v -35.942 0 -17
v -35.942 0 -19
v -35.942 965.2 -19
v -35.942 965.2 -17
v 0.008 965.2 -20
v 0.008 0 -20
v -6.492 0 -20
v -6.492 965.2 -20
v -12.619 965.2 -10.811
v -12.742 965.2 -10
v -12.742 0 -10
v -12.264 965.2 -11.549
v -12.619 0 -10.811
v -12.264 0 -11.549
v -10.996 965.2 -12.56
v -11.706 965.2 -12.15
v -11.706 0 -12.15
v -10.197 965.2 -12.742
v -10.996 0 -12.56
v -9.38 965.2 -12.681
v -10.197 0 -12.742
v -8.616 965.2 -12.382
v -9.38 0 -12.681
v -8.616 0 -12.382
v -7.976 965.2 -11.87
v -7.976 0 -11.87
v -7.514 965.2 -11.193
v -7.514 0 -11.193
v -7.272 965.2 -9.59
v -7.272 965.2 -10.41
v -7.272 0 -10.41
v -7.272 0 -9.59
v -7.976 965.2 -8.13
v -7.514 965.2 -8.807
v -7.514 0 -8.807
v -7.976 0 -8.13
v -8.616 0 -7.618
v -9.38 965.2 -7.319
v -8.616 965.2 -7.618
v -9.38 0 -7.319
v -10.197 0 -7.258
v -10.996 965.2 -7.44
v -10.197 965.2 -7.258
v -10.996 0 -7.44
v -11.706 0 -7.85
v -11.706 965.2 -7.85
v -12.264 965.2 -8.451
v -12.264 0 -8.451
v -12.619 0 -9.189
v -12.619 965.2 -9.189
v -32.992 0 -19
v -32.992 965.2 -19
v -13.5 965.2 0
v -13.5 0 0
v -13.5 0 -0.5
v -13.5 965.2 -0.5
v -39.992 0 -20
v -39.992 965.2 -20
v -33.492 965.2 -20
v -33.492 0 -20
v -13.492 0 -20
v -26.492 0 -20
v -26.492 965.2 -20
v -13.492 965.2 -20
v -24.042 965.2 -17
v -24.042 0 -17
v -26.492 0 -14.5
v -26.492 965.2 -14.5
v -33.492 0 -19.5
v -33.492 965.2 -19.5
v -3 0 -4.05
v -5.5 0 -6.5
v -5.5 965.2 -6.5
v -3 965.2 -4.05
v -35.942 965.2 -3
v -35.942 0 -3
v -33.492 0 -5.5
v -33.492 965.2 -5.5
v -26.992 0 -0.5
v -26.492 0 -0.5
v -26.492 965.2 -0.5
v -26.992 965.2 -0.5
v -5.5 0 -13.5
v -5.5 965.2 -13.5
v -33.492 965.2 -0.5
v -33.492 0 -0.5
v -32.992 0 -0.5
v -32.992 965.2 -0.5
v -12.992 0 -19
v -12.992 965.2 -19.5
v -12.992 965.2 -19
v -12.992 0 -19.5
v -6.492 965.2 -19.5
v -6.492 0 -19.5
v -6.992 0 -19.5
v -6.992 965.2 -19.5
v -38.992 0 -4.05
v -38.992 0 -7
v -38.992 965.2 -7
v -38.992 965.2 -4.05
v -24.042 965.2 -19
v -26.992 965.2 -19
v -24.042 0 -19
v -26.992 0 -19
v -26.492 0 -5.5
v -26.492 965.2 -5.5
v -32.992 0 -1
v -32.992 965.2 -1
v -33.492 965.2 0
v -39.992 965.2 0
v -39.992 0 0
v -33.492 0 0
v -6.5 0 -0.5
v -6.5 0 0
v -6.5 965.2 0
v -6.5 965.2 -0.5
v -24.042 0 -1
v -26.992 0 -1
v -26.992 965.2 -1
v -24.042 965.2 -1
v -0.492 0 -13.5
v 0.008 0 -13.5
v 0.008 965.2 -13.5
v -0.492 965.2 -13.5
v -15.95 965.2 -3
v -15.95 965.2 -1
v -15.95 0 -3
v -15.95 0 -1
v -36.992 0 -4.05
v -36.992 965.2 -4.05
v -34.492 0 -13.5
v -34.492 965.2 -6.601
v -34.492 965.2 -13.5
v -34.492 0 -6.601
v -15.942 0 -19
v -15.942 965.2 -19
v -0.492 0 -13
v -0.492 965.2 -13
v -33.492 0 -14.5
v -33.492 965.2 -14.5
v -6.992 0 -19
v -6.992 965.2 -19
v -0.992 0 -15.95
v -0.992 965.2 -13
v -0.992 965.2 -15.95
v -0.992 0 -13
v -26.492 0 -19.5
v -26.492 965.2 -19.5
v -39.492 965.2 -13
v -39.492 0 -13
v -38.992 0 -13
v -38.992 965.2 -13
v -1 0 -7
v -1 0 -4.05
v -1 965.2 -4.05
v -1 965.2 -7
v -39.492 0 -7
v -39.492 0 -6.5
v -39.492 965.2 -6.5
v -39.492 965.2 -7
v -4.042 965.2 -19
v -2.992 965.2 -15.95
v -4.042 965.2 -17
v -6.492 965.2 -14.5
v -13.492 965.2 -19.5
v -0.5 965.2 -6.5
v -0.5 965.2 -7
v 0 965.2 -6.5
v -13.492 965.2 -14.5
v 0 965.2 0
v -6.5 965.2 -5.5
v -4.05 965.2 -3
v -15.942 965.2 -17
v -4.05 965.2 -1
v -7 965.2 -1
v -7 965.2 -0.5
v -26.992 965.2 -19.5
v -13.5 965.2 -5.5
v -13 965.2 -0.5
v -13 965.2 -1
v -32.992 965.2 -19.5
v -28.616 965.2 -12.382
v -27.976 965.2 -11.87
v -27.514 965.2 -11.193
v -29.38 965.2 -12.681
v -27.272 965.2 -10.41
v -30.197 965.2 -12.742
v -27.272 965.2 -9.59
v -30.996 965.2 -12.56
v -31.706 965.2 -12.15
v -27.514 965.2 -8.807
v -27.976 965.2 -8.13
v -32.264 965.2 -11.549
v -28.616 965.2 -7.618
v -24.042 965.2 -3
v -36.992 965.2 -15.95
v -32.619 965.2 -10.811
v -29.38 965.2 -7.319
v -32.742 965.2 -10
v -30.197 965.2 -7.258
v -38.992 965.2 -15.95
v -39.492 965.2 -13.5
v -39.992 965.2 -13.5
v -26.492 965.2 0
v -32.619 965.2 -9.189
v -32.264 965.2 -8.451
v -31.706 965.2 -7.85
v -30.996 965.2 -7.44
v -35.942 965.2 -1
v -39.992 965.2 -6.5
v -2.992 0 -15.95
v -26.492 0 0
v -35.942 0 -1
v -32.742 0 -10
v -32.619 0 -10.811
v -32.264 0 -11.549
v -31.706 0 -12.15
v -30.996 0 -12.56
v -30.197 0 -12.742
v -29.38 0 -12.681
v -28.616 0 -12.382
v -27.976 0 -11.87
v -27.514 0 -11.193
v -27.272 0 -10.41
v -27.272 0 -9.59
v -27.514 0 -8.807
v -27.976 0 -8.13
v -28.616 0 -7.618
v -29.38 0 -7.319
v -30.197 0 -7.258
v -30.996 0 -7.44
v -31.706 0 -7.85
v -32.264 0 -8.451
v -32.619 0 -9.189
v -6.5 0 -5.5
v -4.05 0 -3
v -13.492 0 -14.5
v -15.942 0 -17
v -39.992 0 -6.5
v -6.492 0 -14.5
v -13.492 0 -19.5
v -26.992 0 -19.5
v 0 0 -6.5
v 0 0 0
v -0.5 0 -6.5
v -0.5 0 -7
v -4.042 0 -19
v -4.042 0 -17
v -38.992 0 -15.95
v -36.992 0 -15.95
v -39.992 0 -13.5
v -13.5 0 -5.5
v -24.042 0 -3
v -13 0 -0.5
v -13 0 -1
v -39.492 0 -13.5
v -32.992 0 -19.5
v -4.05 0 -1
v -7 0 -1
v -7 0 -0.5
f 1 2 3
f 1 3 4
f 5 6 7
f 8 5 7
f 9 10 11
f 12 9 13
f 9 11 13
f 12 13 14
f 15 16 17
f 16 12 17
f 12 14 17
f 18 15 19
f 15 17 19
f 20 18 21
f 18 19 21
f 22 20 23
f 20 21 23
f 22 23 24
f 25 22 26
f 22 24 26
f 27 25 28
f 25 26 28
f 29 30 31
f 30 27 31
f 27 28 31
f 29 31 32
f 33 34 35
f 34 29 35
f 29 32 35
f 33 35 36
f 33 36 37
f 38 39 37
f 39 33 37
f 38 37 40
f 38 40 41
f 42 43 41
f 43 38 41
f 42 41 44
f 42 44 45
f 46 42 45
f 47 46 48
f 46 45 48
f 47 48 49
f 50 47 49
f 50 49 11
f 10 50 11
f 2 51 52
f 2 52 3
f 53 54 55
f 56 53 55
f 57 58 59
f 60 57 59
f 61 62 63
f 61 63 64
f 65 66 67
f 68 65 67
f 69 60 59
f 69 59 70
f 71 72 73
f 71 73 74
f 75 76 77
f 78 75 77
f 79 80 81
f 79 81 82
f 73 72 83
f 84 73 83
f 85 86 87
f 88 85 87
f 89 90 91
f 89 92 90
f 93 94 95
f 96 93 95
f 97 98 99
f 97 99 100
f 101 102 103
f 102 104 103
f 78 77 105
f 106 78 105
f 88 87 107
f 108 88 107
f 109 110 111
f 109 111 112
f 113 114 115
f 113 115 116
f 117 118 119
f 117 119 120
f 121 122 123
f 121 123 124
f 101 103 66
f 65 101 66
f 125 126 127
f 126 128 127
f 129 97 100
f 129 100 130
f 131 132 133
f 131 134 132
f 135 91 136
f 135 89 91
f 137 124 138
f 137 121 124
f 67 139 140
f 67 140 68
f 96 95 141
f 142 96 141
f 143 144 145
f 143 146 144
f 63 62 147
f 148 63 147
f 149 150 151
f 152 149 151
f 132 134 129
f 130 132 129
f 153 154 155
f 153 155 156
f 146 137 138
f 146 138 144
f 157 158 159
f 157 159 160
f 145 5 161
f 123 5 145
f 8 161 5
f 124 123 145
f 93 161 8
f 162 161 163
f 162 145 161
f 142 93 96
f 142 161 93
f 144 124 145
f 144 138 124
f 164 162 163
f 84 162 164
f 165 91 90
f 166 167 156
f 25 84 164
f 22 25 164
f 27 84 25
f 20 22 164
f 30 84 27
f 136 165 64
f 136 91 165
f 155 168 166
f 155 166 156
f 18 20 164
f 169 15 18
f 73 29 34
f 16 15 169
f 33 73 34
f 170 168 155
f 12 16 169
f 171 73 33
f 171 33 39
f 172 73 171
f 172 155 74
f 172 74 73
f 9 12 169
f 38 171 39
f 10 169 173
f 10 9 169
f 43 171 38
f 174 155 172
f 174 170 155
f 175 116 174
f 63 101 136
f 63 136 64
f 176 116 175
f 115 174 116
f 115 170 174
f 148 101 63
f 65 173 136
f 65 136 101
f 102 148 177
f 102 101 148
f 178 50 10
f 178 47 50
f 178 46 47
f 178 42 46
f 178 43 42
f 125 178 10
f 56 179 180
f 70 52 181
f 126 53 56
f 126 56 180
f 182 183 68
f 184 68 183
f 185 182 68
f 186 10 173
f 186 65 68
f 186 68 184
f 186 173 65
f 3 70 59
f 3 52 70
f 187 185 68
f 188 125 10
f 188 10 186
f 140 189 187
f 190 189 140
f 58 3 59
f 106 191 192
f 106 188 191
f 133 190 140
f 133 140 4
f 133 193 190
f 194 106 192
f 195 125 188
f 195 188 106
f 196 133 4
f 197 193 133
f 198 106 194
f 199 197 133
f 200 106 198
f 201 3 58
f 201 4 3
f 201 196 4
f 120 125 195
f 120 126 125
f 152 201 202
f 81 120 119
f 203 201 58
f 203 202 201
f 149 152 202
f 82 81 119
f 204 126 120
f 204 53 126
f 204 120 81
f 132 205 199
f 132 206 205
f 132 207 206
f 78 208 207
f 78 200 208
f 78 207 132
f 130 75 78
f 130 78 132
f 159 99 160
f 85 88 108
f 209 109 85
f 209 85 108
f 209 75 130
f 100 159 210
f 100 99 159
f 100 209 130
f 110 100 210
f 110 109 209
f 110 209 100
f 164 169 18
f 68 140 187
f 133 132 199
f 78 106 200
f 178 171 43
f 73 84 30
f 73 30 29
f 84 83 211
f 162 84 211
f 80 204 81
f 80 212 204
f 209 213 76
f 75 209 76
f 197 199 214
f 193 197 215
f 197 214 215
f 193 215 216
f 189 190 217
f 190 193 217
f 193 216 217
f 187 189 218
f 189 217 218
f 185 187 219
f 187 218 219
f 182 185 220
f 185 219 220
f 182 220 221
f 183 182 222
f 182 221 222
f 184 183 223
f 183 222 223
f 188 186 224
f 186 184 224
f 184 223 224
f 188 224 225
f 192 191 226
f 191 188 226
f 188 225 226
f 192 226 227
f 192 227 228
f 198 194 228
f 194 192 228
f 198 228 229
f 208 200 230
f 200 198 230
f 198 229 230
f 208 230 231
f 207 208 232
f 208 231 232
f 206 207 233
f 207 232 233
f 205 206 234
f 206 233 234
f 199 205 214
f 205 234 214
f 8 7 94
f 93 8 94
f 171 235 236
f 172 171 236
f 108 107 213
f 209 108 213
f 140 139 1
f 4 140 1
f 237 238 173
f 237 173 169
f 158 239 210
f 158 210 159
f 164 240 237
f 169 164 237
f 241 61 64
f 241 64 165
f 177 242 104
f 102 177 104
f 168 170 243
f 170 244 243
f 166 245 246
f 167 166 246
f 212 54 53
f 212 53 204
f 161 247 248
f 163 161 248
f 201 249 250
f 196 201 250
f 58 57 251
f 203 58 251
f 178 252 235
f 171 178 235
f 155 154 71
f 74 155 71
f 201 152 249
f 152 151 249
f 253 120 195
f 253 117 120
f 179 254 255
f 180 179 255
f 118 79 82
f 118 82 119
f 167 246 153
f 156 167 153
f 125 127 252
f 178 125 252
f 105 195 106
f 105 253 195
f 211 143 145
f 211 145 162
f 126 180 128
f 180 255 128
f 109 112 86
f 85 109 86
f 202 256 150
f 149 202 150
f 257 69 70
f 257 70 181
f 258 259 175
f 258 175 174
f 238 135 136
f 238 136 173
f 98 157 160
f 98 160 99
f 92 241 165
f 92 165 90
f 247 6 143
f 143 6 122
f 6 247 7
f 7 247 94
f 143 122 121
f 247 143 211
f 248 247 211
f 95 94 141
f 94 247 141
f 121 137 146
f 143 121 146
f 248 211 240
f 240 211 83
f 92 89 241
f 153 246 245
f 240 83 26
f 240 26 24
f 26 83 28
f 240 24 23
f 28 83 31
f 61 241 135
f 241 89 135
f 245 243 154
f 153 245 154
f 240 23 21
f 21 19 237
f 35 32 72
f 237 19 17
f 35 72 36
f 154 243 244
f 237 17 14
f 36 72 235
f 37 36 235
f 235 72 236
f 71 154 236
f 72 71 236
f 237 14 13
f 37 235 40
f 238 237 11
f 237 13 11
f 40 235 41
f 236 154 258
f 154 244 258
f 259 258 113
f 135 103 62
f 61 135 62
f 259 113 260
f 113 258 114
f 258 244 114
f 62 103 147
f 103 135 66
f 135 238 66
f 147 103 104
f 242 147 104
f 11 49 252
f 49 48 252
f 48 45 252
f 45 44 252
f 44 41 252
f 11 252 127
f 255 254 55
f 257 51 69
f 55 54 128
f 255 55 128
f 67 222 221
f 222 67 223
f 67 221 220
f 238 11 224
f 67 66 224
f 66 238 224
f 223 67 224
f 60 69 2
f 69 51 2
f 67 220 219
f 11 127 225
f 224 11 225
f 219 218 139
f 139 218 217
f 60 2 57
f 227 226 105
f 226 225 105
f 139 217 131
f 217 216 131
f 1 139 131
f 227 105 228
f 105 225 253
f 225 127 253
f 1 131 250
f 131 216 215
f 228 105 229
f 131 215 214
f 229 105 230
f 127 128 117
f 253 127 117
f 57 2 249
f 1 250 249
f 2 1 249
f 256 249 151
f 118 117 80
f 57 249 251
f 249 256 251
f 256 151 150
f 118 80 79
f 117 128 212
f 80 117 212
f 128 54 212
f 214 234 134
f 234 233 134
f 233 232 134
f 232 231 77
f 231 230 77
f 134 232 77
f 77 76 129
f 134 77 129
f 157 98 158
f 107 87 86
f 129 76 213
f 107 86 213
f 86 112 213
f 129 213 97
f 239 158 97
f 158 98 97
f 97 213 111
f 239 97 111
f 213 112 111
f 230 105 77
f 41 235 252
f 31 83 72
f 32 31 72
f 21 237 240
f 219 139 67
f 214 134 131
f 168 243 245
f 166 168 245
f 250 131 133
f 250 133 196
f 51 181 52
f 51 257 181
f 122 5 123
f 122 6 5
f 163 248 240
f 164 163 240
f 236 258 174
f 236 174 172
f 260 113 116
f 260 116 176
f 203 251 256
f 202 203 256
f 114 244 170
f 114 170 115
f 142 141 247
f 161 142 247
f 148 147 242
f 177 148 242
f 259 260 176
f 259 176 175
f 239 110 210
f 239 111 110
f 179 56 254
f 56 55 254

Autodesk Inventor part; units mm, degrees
ref_plane "YZ Plane" through (0, 0, 0) normal (1, 0, 0) x (0, 1, 0)
ref_plane "XZ Plane" through (0, 0, 0) normal (0, 1, 0) x (-1, 0, 0)
ref_plane "XY Plane" through (0, 0, 0) normal (0, 0, 1) x (1, 0, 0)
sketch "Sketch1" plane through (0, 0, 0) normal (0, 1, 0) x (-1, 0, 0)
  circle A0 centre (29.9915, -10) radius 2.75
  circle A1 centre (9.9915, -10) radius 2.75
  line L0 (0, 0) -> (0, -6.5)
  line L1 (-0.0085, -20) -> (-0.0085, -13.5)
  line L2 (0, -6.5) -> (0.5, -6.5)
  line L3 (0.5, -6.5) -> (0.5, -7)
  line L4 (0.5, -7) -> (1, -7)
  line L5 (-0.0085, -13.5) -> (0.4915, -13.5)
  line L6 (0.4915, -13.5) -> (0.4915, -13)
  line L7 (0.4915, -13) -> (0.9915, -13)
  line L8 (1, -4.05) -> (3, -4.05)
  line L9 (0.9915, -15.95) -> (2.9915, -15.95)
  line L10 (5.5, -6.5) -> (5.5, -13.5)
  line L11 (5.5, -13.5) -> (2.9915, -15.95)
  line L12 (5.5, -6.5) -> (3, -4.05)
  line L13 (1, -4.05) -> (1, -7)
  line L14 (0.9915, -13) -> (0.9915, -15.95)
  line L15 (-0.0085, -20) -> (6.4915, -20)
  line L16 (6.4915, -20) -> (6.4915, -19.5)
  line L17 (6.4915, -19.5) -> (6.9915, -19.5)
  line L18 (6.9915, -19.5) -> (6.9915, -19)
  line L19 (6.9915, -19) -> (4.0415, -19)
  line L20 (4.0415, -19) -> (4.0415, -17)
  line L21 (13.4915, -20) -> (13.4915, -19.5)
  line L22 (13.4915, -19.5) -> (12.9915, -19.5)
  line L23 (12.9915, -19.5) -> (12.9915, -19)
  line L24 (12.9915, -19) -> (15.9415, -19)
  line L25 (15.9415, -19) -> (15.9415, -17)
  line L26 (15.9415, -17) -> (13.4915, -14.5)
  line L27 (6.4915, -14.5) -> (13.4915, -14.5)
  line L28 (4.0415, -17) -> (6.4915, -14.5)
  line L29 (39.9915, 0) -> (39.9915, -6.5)
  line L30 (39.9915, -6.5) -> (39.4915, -6.5)
  line L31 (39.4915, -6.5) -> (39.4915, -7)
  line L32 (39.4915, -7) -> (38.9915, -7)
  line L33 (38.9915, -7) -> (38.9915, -4.05)
  line L34 (38.9915, -4.05) -> (36.9915, -4.05)
  line L35 (39.9915, -20) -> (39.9915, -13.5)
  line L36 (39.9915, -13.5) -> (39.4915, -13.5)
  line L37 (39.4915, -13.5) -> (39.4915, -13)
  line L38 (39.4915, -13) -> (38.9915, -13)
  line L39 (38.9915, -13) -> (38.9915, -15.95)
  line L40 (38.9915, -15.95) -> (36.9915, -15.95)
  line L41 (34.4915, -6.601) -> (34.4915, -13.5)
  line L42 (34.4915, -13.5) -> (36.9915, -15.95)
  line L43 (34.4915, -6.601) -> (36.9915, -4.05)
  line L44 (39.9915, -20) -> (33.4915, -20)
  line L45 (33.4915, -20) -> (33.4915, -19.5)
  line L46 (33.4915, -19.5) -> (32.9915, -19.5)
  line L47 (32.9915, -19.5) -> (32.9915, -19)
  line L48 (32.9915, -19) -> (35.9415, -19)
  line L49 (35.9415, -19) -> (35.9415, -17)
  line L50 (26.4915, -20) -> (26.4915, -19.5)
  line L51 (26.4915, -19.5) -> (26.9915, -19.5)
  line L52 (26.9915, -19.5) -> (26.9915, -19)
  line L53 (26.9915, -19) -> (24.0415, -19)
  line L54 (24.0415, -19) -> (24.0415, -17)
  line L55 (33.4915, -14.5) -> (26.4915, -14.5)
  line L56 (24.0415, -17) -> (26.4915, -14.5)
  line L57 (33.4915, -14.5) -> (35.9415, -17)
  line L58 (26.4915, -20) -> (13.4915, -20)
  line L59 (39.9915, 0) -> (33.4915, 0)
  line L60 (33.4915, 0) -> (33.4915, -0.5)
  line L61 (33.4915, -0.5) -> (32.9915, -0.5)
  line L62 (32.9915, -0.5) -> (32.9915, -1)
  line L63 (32.9915, -1) -> (35.9415, -1)
  line L64 (35.9415, -1) -> (35.9415, -3)
  line L65 (26.4915, 0) -> (26.4915, -0.5)
  line L66 (26.4915, -0.5) -> (26.9915, -0.5)
  line L67 (26.9915, -0.5) -> (26.9915, -1)
  line L68 (26.9915, -1) -> (24.0415, -1)
  line L69 (24.0415, -1) -> (24.0415, -3)
  line L70 (33.4915, -5.5) -> (26.4915, -5.5)
  line L71 (24.0415, -3) -> (26.4915, -5.5)
  line L72 (35.9415, -3) -> (33.4915, -5.5)
  line L73 (0, 0) -> (6.5, 0)
  line L74 (6.5, 0) -> (6.5, -0.5)
  line L75 (6.5, -0.5) -> (7, -0.5)
  line L76 (7, -0.5) -> (7, -1)
  line L77 (7, -1) -> (4.05, -1)
  line L78 (4.05, -1) -> (4.05, -3)
  line L79 (13.5, 0) -> (13.5, -0.5)
  line L80 (13.5, -0.5) -> (13, -0.5)
  line L81 (13, -0.5) -> (13, -1)
  line L82 (13, -1) -> (15.95, -1)
  line L83 (15.95, -1) -> (15.95, -3)
  line L84 (13.5, -5.5) -> (6.5, -5.5)
  line L85 (6.5, -5.5) -> (4.05, -3)
  line L86 (15.95, -3) -> (13.5, -5.5)
  line L87 (13.5, 0) -> (26.4915, 0)
  dimension "d0" = 40
  dimension "d1" = 20
  dimension "d2" = 5.5
  dimension "d3" = 5.5
  dimension "d4" = 20
  dimension "d11" = 6.5
  dimension "d12" = 6.5
  dimension "d13" = 0.5
  dimension "d14" = 0.5
  dimension "d15" = 0.5
  dimension "d16" = 0.5
  dimension "d17" = 0.5
  dimension "d18" = 0.5
  dimension "d19" = 5.5
  dimension "d20" = 11.9
  dimension "d21" = 6.5
  dimension "d22" = 0.5
  dimension "d23" = 0.5
  dimension "d24" = 0.5
  dimension "d25" = 0.5
  dimension "d26" = 0.5
  dimension "d27" = 0.5
  dimension "d28" = 7
  dimension "d29" = 11.9
  dimension "d31" = 4.05
  dimension "d32" = 2.95
  dimension "d34" = 2
  dimension "d35" = 2
  dimension "d36" = 2
  dimension "d37" = 2
  dimension "d39" = 7
  dimension "d40" = 6.5
  dimension "d41" = 0.5
  dimension "d42" = 0.5
  dimension "d43" = 0.5
  dimension "d44" = 2.95
  dimension "d45" = 2
  dimension "d46" = 6.5
  dimension "d47" = 0.5
  dimension "d48" = 0.5
  dimension "d49" = 0.5
  dimension "d50" = 2.95
  dimension "d51" = 2
  dimension "d52" = 5.5
  dimension "d53" = 6.5
  dimension "d54" = 0.5
  dimension "d55" = 0.5
  dimension "d56" = 0.5
  dimension "d57" = 2.95
  dimension "d58" = 2
  dimension "d59" = 0.5
  dimension "d60" = 0.5
  dimension "d61" = 0.5
  dimension "d62" = 2.95
  dimension "d63" = 2
  dimension "d64" = 7
  dimension "d66" = 6.5
  dimension "d67" = 0.5
  dimension "d68" = 0.5
  dimension "d69" = 0.5
  dimension "d70" = 2.95
  dimension "d71" = 2
  dimension "d72" = 0.5
  dimension "d73" = 0.5
extrude "Extrusion1" add sketch "Sketch1" along normal blind 965.2
properties part number "Tslot_2040extrusion_38inch"
